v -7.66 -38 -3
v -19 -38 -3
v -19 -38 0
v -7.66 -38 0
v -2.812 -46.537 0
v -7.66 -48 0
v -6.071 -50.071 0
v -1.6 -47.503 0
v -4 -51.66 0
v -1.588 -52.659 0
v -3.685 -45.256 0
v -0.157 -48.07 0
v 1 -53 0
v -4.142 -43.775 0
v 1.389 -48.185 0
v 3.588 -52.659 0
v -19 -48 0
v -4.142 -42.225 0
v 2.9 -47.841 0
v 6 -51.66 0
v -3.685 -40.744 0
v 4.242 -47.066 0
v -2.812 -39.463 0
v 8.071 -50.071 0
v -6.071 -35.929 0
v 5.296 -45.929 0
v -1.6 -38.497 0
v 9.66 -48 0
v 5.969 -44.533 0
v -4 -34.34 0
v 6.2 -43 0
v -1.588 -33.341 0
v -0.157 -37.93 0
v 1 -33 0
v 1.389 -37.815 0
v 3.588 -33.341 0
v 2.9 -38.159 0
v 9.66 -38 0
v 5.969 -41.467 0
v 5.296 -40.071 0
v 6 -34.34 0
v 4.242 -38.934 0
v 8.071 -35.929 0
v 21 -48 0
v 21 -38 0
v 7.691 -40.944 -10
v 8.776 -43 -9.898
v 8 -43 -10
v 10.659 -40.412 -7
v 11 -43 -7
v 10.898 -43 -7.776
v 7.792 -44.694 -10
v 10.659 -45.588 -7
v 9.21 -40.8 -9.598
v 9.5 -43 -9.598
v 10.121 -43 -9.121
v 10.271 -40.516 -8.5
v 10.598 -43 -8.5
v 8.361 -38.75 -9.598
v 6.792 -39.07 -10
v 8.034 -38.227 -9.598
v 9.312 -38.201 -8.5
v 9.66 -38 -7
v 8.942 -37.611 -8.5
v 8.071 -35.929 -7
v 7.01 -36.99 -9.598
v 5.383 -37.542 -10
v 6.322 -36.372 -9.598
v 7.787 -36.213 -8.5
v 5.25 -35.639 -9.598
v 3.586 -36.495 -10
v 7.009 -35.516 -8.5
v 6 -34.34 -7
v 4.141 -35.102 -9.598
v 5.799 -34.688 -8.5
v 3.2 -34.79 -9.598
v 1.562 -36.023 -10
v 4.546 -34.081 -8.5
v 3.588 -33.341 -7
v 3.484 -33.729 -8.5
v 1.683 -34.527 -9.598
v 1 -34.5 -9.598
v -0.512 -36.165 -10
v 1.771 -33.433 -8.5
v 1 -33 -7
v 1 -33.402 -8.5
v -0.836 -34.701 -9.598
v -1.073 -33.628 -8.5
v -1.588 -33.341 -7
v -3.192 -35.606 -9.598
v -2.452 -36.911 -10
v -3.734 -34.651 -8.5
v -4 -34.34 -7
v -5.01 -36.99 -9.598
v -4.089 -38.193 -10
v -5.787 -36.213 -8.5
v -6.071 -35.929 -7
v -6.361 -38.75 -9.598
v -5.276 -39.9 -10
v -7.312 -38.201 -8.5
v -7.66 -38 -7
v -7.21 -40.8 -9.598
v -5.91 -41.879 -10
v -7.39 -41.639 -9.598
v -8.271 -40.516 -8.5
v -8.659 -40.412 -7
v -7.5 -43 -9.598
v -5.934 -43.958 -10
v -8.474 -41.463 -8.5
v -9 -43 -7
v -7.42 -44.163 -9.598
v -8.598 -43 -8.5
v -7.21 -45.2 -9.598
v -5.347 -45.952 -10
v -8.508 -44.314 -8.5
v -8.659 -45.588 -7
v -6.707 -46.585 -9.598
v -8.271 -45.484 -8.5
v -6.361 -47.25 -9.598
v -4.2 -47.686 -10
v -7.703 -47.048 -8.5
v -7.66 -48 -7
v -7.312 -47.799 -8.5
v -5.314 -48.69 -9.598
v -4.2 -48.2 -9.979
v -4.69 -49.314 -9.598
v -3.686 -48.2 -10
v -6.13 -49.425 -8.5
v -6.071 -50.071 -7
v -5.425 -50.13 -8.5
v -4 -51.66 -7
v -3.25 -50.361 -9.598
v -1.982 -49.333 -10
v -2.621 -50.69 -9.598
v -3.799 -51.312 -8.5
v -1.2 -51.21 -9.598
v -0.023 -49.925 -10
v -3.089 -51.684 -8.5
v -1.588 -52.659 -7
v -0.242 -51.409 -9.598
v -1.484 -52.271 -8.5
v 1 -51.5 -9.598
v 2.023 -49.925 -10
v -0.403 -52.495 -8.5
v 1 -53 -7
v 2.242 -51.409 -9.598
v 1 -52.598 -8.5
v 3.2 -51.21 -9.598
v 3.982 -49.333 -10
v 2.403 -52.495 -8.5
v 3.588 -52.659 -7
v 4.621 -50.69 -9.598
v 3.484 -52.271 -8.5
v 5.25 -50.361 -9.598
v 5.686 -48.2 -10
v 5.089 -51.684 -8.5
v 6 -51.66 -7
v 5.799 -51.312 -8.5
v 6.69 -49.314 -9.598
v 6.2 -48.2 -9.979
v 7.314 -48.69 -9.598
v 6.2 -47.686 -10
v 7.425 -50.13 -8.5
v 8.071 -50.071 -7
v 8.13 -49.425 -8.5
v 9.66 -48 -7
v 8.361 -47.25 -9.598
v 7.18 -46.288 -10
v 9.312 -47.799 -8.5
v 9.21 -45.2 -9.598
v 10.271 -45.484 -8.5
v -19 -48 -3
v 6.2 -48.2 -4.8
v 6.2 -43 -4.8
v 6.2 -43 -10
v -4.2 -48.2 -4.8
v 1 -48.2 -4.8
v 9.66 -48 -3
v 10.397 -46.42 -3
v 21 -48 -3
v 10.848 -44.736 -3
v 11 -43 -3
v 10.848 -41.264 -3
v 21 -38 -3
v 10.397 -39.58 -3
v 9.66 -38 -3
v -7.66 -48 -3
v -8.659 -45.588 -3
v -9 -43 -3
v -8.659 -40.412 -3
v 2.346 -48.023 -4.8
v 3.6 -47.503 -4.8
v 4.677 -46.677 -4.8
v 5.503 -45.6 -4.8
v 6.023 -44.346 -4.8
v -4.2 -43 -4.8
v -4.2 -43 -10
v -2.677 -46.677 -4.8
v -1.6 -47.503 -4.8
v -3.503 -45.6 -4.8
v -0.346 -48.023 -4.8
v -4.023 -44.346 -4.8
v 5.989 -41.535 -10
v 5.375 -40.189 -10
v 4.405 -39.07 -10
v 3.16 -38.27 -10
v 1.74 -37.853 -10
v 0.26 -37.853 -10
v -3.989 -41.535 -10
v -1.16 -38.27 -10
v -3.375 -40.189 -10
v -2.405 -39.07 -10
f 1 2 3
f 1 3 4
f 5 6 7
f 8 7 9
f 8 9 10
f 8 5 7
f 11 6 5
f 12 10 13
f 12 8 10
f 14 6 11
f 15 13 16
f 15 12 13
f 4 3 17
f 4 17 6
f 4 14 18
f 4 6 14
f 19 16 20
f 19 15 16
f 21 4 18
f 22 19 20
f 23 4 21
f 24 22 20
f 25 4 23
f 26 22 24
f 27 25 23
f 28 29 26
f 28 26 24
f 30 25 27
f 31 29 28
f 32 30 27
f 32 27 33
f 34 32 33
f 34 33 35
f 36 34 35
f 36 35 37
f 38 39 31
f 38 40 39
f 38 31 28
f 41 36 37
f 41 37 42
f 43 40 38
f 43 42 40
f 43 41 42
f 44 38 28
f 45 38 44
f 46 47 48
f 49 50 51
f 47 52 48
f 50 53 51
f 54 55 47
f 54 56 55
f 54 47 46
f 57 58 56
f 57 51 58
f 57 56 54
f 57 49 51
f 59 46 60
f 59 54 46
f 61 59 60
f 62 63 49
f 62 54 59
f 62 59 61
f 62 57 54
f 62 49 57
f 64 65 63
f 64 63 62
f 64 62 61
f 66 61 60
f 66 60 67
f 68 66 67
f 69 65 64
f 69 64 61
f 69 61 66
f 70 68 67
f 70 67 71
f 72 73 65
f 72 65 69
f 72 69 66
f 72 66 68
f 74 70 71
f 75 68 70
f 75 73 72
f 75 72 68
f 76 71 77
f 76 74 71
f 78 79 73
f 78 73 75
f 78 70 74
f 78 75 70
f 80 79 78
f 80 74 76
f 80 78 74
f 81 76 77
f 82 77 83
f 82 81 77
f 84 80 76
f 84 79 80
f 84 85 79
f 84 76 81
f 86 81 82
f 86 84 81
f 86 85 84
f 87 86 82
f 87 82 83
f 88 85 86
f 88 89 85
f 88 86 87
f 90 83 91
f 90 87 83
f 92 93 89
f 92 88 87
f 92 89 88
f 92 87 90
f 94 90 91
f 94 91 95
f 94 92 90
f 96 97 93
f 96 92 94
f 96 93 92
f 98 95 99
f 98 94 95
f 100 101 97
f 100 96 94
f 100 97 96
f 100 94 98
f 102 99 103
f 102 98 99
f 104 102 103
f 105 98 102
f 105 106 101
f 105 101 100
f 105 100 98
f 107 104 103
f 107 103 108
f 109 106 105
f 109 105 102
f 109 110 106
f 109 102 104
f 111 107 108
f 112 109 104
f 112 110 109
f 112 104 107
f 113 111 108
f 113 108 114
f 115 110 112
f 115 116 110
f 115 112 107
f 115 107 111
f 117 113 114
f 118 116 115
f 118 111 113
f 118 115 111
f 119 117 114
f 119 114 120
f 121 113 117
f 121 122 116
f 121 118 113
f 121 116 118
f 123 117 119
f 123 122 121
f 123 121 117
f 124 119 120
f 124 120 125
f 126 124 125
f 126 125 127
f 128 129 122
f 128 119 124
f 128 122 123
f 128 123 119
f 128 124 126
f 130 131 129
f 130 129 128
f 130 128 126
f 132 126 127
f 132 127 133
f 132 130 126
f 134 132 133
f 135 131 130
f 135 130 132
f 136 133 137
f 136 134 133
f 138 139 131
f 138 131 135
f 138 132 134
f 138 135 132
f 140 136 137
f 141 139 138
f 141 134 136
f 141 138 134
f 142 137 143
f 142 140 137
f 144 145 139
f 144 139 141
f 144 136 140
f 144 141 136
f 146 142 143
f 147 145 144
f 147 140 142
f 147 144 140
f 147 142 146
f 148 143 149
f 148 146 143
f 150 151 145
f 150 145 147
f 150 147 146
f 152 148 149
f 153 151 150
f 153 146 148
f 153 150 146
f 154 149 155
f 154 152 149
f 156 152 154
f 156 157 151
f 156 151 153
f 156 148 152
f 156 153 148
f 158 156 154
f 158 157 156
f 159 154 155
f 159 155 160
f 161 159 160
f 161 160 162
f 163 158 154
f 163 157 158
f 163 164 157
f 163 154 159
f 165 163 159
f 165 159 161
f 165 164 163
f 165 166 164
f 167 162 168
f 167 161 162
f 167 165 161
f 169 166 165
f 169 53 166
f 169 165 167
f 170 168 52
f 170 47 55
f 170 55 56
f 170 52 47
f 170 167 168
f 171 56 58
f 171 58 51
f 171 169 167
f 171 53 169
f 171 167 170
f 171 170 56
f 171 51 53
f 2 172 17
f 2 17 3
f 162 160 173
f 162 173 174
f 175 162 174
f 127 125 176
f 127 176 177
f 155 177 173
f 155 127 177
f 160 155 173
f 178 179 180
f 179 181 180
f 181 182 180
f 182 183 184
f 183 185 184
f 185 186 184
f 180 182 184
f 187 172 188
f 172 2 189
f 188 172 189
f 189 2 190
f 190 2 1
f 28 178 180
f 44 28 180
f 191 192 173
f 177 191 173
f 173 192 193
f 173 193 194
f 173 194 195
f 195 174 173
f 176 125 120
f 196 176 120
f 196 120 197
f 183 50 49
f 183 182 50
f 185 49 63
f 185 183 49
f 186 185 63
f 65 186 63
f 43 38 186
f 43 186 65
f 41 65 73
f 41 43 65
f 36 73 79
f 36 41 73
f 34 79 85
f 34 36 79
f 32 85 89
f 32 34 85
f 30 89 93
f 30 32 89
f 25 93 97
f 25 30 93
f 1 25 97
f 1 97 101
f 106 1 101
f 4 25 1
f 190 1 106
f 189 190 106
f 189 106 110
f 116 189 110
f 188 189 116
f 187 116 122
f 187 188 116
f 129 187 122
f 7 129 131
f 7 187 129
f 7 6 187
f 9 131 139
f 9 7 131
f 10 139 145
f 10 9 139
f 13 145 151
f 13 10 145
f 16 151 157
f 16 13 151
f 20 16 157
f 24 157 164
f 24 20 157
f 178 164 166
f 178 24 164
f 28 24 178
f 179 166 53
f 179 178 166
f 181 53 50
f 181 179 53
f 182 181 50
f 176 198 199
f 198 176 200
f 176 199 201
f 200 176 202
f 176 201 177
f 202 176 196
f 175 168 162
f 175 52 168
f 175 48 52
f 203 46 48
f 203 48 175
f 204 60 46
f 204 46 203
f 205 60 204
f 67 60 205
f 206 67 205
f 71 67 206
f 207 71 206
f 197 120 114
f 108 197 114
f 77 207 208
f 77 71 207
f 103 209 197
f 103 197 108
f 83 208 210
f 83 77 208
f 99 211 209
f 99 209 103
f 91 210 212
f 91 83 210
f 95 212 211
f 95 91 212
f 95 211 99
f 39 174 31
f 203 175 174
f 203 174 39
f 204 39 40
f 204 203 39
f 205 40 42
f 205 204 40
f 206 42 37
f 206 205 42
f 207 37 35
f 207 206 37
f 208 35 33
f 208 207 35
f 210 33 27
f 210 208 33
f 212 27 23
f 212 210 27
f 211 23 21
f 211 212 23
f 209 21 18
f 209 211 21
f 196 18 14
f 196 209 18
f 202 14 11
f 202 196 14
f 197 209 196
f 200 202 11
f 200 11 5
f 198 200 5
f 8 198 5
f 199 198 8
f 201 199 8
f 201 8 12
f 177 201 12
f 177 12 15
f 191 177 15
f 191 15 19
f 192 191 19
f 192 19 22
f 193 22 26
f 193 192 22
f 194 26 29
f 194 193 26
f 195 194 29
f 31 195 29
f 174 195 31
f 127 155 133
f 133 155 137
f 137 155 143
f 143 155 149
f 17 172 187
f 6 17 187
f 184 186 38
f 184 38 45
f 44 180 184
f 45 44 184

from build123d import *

# Parameters (mm, degrees)
CONE001_W         = 10
CONE001_H         = 10
FILLET002_R       = 3
BOX007_W          = 10.4
BOX007_H          = 5.2
BOX007_DEPTH      = 5.2
BOX008_W          = 40
BOX008_H          = 10
BOX008_DEPTH      = 3
CYLINDER011_R     = 5.2
CYLINDER011_DEPTH = 10


with BuildPart() as part:
    # Cone001 → Cone001 (revolve)
    with BuildSketch(Plane.XZ):
        with Locations((5, 5)):
            Rectangle(CONE001_W, CONE001_H)
    revolve(axis=Axis((0, 0, 0), (0, 0, 1)))

    # Fillet002
    fillet002_edges = [part.edges().sort_by_distance(p)[0] for p in [
        (-10, 0, 0),
    ]]
    fillet(fillet002_edges, radius=FILLET002_R)

    # Box007 → Box007 (cut)
    with BuildSketch(Plane(origin=(-5.2, -5.2, 0), x_dir=(1, 0, 0), z_dir=(0, 0, 1))):
        with Locations((5.2, 2.6)):
            Rectangle(BOX007_W, BOX007_H)
    extrude(amount=BOX007_DEPTH, mode=Mode.SUBTRACT)

    # Box008 → Box008 (join)
    with BuildSketch(Plane(origin=(-20, -5, 7), x_dir=(1, 0, 0), z_dir=(0, 0, 1))):
        with Locations((20, 5)):
            Rectangle(BOX008_W, BOX008_H)
    extrude(amount=BOX008_DEPTH)

    # Cylinder011 → Cylinder011 (cut)
    with BuildSketch(Plane.XY):
        Circle(CYLINDER011_R)
    extrude(amount=CYLINDER011_DEPTH, mode=Mode.SUBTRACT)


with BuildPart() as part_1:
    # Body006 placement: moved
    add(part.part.moved(Location((1, -43, -10))))


solid = part_1.part
